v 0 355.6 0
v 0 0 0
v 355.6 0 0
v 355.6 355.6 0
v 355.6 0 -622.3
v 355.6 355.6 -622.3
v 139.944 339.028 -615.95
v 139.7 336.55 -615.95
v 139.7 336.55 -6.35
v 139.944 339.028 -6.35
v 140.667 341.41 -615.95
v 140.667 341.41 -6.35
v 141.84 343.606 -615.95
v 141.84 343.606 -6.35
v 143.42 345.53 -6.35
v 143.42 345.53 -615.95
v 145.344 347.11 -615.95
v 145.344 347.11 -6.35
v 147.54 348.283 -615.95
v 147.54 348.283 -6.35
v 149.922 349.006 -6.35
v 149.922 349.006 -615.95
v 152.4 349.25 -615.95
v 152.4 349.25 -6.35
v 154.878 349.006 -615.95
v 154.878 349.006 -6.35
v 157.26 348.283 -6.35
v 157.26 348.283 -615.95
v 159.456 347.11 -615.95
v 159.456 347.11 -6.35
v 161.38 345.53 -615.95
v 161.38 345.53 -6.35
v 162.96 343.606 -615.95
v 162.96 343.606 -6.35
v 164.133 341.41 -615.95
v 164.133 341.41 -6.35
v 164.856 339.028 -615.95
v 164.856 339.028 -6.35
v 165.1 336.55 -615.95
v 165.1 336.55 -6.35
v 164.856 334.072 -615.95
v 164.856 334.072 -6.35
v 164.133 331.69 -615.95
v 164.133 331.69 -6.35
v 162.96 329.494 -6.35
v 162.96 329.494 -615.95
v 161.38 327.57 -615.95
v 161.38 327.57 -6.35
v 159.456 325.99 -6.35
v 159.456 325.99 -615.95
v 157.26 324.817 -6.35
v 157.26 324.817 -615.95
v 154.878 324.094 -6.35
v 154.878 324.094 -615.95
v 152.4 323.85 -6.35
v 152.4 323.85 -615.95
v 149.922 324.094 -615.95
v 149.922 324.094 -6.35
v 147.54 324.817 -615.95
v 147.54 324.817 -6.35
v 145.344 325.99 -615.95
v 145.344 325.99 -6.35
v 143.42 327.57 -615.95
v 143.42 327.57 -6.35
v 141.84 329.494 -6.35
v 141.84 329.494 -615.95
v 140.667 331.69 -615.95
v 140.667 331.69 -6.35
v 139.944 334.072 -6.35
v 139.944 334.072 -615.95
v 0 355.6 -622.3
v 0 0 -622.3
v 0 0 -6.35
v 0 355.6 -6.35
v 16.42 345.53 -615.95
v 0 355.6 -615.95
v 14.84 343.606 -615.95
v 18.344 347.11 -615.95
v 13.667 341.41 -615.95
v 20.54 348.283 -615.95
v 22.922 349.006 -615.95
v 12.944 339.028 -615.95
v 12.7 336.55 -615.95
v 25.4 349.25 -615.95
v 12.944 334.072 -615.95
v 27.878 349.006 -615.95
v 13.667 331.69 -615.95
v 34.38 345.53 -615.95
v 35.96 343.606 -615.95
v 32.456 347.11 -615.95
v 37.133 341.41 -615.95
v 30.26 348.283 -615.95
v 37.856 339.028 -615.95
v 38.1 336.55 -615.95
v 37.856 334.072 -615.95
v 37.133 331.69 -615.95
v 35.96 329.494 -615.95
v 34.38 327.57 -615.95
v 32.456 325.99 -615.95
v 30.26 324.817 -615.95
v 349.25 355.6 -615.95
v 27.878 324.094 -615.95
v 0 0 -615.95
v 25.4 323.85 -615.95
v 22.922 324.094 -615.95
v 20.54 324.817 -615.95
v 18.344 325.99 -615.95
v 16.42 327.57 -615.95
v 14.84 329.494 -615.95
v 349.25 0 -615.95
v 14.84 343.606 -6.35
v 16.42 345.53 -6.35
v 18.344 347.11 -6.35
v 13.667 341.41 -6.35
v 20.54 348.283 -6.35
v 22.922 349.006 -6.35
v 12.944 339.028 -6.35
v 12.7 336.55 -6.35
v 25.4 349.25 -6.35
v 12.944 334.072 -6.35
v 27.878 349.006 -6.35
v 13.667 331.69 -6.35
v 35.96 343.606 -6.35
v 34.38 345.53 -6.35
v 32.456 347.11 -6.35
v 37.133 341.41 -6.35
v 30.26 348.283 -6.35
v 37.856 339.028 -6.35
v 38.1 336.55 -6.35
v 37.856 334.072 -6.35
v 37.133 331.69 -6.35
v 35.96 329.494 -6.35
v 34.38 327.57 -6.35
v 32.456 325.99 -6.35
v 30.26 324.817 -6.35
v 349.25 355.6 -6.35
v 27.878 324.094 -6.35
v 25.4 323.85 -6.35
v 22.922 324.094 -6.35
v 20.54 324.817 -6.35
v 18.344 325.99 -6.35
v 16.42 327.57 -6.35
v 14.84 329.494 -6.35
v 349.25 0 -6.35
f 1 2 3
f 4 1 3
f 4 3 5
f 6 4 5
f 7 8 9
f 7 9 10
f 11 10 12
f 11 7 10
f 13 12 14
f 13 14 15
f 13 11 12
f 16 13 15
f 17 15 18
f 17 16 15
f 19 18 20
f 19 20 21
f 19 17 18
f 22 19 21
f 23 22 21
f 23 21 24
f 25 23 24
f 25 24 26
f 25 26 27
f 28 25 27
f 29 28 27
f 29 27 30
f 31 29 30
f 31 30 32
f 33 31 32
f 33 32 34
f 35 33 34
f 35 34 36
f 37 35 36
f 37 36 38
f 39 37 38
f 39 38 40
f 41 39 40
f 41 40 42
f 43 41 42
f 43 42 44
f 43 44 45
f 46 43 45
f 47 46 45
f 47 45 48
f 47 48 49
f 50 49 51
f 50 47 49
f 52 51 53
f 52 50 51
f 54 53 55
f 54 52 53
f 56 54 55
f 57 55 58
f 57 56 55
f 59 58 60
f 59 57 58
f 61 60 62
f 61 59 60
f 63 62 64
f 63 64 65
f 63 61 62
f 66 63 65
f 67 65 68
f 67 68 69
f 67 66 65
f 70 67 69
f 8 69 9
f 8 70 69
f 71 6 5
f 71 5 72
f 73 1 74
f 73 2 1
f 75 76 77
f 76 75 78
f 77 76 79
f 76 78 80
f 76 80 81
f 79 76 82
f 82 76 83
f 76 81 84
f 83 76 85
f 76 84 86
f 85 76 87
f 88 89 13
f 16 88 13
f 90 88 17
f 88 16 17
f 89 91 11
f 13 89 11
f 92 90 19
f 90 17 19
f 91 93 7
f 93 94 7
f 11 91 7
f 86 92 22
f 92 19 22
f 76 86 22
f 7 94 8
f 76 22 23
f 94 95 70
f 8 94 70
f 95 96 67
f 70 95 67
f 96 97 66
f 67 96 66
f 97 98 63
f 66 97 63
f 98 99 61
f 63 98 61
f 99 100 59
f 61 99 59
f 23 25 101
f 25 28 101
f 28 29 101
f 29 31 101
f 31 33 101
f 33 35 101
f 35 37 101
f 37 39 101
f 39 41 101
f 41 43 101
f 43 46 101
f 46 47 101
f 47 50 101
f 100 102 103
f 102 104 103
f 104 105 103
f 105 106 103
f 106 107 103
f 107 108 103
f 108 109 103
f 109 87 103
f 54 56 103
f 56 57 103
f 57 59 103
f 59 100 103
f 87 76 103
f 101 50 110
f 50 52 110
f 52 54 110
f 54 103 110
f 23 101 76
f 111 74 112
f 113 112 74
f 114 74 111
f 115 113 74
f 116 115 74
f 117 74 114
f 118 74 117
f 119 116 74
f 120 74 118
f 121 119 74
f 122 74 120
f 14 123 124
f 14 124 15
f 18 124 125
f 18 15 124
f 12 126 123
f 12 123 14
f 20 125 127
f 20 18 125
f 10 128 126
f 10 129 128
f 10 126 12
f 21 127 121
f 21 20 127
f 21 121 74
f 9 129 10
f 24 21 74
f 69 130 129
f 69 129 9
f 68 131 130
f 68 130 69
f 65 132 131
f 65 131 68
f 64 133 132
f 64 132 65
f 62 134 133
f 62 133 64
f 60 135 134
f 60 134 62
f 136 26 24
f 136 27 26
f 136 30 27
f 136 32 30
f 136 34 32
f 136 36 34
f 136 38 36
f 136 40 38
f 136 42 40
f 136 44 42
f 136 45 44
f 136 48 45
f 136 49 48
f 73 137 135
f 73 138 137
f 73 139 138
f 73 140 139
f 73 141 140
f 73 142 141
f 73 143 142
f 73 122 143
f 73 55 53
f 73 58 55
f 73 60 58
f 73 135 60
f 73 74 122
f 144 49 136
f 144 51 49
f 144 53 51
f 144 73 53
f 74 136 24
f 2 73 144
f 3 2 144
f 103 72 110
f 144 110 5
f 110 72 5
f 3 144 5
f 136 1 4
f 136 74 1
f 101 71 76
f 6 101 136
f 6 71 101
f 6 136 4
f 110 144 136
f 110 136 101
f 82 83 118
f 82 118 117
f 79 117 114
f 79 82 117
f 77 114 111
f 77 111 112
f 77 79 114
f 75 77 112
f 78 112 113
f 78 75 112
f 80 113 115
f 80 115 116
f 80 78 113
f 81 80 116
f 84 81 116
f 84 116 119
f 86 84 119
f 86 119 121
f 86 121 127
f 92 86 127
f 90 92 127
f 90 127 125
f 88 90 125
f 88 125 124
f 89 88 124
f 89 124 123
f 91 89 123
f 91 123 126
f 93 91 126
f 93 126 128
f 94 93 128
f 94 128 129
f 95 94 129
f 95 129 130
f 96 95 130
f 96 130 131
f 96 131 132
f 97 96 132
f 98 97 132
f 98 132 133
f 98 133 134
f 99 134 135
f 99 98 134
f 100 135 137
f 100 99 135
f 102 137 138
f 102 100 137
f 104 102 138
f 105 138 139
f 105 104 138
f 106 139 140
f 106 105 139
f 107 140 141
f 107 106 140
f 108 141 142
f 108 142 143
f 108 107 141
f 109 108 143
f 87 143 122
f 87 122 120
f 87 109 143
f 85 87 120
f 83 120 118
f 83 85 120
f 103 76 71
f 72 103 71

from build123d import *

# Parameters (mm, degrees)
SKETCH1_W           = 355.6
SKETCH1_H           = 622.3
BOSS_EXTRUDE1_DEPTH = 355.6
SHELL1_T            = -6.35
SKETCH2_R           = 12.7
BOSS_EXTRUDE2_DEPTH = 622.3


with BuildPart() as part:
    # Sketch1 → Boss-Extrude1 (new body)
    with BuildSketch(Plane(origin=(0, 0, 0), x_dir=(1, 0, 0), z_dir=(0, 1, 0))):
        with Locations((177.8, 311.15)):
            Rectangle(SKETCH1_W, SKETCH1_H)
    extrude(amount=BOSS_EXTRUDE1_DEPTH)

    # Shell1
    shell1_openings = [part.faces().sort_by_distance(p)[0] for p in [
        (177.8, 355.6, -311.15),
        (177.8, 0, -311.15),
        (0, 177.8, -311.15),
    ]]
    offset(amount=SHELL1_T, openings=shell1_openings, kind=Kind.INTERSECTION)

    # Sketch2 → Boss-Extrude2 (add)
    with BuildSketch(Plane(origin=(0, 0, -622.3), x_dir=(-1, 0, 0), z_dir=(0, 0, -1))):
        with Locations((-152.4, 336.55)):
            Circle(SKETCH2_R)
        with Locations((-25.4, 336.55)):
            Circle(SKETCH2_R)
    extrude(amount=-BOSS_EXTRUDE2_DEPTH)


solid = part.part
